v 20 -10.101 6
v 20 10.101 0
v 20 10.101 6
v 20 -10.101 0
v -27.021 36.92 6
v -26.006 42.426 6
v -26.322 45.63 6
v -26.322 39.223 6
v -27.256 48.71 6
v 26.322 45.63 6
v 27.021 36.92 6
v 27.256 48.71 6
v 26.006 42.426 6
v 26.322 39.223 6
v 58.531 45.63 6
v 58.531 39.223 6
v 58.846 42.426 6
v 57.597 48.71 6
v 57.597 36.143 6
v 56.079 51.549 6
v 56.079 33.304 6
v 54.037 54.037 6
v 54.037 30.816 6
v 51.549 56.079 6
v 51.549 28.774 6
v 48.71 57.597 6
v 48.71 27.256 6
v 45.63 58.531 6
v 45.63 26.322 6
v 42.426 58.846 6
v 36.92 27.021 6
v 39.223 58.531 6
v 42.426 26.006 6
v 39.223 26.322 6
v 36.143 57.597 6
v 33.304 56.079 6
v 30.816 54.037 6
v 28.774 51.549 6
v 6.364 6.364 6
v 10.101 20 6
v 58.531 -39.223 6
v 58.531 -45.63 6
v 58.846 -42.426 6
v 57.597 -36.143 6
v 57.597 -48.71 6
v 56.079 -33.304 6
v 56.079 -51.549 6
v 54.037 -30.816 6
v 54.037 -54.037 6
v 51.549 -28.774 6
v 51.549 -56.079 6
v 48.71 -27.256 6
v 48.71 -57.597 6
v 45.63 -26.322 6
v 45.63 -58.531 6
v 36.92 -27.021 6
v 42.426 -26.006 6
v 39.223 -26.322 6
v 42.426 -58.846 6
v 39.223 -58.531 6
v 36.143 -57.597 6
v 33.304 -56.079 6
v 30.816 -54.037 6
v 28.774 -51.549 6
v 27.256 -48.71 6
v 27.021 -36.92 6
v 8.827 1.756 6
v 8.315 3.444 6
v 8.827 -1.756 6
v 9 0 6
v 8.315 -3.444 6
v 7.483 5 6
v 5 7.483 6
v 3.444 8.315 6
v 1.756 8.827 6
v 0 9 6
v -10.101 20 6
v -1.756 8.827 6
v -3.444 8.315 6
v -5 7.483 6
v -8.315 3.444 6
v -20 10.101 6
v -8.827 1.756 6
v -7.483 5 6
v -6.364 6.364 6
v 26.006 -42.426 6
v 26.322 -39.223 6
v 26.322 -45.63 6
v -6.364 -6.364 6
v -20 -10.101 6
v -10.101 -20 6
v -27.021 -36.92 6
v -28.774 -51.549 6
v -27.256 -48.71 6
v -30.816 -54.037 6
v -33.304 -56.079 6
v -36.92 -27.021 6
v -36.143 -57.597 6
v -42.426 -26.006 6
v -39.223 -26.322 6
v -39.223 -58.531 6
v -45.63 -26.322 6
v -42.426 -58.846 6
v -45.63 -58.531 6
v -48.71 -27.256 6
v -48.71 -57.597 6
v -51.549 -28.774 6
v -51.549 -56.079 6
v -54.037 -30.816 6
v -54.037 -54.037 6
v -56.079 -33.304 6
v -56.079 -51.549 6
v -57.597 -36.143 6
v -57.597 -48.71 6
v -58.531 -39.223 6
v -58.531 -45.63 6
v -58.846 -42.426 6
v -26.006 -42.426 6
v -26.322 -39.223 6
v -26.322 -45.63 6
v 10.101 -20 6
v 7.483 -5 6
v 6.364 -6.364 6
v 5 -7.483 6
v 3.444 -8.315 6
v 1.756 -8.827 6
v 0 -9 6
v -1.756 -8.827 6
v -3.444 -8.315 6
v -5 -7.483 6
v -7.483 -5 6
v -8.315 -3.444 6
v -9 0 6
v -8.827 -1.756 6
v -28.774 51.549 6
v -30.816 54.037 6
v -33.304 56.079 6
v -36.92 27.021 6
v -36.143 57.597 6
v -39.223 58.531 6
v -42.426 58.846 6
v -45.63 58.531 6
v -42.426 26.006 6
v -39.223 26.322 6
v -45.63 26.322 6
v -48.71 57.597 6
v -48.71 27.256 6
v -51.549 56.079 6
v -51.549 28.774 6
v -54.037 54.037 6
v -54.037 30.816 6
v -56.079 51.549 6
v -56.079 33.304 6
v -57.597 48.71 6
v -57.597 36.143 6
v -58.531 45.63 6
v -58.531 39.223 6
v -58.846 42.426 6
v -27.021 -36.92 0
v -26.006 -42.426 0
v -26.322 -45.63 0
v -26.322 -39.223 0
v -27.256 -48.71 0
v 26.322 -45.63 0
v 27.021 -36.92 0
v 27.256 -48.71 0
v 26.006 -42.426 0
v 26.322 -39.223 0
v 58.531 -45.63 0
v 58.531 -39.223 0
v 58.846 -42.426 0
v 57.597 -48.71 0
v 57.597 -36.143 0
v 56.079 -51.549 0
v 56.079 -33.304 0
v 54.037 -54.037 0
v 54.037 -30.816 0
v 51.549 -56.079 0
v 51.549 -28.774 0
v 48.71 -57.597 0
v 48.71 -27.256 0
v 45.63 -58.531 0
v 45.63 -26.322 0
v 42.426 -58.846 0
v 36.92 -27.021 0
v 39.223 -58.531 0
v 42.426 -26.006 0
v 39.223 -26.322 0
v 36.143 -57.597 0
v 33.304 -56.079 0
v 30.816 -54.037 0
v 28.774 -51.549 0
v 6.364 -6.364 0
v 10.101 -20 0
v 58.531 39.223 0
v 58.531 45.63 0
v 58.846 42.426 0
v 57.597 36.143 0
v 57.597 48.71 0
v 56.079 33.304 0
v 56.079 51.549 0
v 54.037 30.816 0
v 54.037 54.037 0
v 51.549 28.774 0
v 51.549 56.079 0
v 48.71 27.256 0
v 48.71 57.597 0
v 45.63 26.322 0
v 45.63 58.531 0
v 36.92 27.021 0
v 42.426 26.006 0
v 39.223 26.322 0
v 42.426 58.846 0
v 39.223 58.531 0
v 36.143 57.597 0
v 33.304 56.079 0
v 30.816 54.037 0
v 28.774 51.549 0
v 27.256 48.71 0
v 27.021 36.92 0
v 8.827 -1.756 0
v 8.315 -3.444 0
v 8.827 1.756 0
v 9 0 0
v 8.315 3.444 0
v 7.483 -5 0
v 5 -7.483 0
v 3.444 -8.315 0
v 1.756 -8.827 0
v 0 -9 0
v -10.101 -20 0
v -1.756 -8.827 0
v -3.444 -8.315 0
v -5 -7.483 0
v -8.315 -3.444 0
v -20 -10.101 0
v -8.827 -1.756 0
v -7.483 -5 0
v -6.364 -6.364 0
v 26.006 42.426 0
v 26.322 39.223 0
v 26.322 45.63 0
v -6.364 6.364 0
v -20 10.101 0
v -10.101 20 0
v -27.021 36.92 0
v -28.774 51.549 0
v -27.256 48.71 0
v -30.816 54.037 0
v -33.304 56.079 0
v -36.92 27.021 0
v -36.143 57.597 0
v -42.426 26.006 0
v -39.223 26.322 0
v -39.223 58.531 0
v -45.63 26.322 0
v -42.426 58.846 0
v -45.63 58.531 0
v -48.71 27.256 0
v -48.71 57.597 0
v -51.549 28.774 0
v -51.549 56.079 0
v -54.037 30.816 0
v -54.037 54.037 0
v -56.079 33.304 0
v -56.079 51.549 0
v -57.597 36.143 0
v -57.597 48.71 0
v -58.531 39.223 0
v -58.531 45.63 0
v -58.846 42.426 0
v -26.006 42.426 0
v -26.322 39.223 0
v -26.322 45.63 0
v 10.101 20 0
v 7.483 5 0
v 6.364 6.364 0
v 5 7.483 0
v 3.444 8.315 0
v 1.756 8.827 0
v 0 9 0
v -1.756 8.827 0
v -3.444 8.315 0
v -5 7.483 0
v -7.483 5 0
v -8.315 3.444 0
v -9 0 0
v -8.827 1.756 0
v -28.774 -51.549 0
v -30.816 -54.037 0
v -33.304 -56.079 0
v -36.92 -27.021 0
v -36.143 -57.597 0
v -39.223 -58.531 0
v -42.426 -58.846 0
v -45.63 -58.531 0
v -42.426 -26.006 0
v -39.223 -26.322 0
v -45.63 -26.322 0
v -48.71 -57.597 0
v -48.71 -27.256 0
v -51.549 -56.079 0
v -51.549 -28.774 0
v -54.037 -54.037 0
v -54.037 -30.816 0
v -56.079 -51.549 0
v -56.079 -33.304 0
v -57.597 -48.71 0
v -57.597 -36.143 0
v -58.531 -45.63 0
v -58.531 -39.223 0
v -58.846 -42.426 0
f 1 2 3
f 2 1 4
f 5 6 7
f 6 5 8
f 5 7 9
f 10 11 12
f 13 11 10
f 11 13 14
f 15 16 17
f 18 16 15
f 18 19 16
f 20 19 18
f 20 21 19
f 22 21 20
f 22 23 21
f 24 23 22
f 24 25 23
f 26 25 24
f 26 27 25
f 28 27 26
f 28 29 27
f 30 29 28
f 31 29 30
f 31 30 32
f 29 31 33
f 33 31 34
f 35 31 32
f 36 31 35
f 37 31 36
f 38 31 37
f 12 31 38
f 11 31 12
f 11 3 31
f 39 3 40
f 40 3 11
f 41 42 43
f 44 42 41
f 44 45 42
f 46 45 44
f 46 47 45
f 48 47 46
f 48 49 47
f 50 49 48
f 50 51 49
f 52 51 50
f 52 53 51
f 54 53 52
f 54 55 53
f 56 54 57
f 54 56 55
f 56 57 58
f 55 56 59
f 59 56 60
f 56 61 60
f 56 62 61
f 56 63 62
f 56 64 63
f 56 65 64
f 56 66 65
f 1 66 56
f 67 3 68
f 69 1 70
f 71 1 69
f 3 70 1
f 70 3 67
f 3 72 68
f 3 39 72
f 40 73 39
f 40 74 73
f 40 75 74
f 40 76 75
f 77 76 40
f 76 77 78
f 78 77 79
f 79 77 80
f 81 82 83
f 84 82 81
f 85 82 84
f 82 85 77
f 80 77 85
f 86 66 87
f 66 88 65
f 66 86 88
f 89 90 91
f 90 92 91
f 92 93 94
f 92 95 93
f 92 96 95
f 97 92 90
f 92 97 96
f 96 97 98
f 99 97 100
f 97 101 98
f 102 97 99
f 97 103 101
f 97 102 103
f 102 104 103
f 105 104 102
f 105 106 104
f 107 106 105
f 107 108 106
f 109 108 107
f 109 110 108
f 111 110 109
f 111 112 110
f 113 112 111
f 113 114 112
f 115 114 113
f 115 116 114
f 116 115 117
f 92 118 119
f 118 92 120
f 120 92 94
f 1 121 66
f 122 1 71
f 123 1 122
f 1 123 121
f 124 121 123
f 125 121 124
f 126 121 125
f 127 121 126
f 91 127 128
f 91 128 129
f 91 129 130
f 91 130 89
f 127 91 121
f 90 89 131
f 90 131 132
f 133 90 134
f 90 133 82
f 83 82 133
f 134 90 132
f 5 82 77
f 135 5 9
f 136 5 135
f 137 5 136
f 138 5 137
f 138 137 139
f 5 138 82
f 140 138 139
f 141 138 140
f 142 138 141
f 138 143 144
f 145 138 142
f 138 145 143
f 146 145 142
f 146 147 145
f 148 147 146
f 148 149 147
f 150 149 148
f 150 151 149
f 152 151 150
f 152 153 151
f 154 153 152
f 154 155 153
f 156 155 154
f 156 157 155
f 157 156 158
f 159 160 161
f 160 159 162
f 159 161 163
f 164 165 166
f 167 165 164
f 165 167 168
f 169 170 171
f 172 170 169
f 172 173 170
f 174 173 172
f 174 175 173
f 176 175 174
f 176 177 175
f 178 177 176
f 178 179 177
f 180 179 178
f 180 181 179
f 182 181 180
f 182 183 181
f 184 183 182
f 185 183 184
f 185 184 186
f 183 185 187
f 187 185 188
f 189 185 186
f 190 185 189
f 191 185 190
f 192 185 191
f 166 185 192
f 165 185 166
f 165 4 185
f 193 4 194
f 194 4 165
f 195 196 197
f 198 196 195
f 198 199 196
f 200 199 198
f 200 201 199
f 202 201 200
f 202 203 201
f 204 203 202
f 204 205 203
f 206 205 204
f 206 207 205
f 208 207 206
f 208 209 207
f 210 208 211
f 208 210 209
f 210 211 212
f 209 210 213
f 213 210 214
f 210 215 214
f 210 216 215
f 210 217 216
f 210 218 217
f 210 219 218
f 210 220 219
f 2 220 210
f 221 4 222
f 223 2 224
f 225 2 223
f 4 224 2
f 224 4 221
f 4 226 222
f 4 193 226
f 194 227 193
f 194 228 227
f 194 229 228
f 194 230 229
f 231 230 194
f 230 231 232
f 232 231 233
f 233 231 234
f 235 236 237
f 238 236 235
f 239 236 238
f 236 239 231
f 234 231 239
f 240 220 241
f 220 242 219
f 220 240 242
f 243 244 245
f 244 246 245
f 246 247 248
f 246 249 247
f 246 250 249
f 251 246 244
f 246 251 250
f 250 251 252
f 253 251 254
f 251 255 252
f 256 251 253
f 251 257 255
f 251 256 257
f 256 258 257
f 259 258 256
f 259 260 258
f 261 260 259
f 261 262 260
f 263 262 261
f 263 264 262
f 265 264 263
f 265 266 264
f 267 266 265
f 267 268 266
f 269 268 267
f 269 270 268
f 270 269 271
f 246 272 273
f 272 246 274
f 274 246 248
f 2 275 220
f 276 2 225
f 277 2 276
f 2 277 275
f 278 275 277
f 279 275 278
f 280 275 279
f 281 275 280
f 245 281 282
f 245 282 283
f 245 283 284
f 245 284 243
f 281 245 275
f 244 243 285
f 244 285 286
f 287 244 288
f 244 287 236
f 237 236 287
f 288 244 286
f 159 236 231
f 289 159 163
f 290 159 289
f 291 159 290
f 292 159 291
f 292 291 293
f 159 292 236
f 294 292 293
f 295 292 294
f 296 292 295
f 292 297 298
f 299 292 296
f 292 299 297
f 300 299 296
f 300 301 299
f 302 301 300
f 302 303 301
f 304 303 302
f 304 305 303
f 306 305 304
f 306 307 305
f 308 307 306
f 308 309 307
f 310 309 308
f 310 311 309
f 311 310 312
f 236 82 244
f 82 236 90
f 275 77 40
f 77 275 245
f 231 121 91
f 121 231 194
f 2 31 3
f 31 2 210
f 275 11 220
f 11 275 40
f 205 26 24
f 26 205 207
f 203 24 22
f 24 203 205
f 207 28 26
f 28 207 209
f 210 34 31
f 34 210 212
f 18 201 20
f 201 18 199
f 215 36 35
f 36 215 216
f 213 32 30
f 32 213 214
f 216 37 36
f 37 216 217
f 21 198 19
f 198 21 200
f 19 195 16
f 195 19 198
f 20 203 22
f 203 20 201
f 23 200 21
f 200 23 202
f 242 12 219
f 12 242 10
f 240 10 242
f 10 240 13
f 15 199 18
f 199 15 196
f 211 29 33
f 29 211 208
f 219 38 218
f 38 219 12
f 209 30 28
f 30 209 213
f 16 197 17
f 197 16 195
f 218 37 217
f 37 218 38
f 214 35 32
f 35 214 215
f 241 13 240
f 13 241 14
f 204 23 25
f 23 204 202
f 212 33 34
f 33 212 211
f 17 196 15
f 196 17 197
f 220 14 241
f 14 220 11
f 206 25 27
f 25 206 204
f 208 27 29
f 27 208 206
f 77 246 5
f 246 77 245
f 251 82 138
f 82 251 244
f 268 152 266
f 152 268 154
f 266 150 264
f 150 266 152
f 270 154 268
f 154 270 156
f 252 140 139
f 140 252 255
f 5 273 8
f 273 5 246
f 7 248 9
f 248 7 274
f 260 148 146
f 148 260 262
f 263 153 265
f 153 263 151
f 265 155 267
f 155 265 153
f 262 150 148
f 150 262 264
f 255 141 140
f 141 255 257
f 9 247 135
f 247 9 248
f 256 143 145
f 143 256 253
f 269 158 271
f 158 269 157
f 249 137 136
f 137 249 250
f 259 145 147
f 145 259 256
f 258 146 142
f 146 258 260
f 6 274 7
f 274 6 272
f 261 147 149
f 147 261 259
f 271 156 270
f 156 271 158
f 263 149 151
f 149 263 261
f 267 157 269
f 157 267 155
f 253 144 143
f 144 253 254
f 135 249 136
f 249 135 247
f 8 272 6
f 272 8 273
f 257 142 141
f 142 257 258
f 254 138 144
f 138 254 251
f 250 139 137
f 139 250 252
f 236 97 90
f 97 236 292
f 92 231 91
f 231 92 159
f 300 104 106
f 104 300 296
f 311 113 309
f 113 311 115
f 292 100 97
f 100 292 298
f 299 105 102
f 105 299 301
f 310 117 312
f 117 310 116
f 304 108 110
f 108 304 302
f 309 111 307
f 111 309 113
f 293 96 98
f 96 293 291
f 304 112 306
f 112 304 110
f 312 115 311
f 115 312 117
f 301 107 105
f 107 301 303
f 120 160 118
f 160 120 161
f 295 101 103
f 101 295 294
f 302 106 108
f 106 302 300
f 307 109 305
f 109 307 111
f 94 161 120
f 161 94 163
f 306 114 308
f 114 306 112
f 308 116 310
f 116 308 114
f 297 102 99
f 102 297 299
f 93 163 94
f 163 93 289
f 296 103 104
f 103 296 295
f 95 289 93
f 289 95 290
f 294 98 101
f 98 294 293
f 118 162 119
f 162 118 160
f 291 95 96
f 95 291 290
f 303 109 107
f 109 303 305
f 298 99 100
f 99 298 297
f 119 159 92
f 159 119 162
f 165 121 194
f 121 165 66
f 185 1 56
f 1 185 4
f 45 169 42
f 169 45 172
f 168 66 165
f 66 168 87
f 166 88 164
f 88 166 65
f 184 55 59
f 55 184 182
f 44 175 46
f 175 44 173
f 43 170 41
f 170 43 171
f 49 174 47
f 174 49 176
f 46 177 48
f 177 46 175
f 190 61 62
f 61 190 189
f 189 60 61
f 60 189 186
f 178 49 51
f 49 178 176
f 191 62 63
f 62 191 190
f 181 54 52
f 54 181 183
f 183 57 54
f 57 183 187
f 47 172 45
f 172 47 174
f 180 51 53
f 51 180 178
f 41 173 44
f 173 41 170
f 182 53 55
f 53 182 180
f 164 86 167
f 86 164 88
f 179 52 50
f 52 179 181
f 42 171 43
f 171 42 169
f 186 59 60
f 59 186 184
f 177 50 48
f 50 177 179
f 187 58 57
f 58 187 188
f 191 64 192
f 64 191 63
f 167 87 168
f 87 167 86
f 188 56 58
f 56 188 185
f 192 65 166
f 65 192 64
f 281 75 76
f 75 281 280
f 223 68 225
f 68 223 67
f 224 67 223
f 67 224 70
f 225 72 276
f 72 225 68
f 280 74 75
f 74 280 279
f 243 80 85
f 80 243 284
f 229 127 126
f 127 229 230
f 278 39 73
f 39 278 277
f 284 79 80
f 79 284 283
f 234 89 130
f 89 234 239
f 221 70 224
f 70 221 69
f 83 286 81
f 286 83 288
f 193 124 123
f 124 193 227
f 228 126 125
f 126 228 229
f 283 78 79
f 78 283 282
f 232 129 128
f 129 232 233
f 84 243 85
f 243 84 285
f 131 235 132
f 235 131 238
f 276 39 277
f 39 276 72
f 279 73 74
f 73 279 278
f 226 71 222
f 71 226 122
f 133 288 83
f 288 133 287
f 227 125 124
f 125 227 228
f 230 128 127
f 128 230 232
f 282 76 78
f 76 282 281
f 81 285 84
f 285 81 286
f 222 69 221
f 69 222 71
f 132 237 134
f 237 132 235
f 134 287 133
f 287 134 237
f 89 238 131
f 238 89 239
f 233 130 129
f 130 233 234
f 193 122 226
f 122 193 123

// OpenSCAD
$fn = 32;

// ----------------------------------------------------------------------
// Quadcopter frame: 152.84 mm across the motor pads, arms 60 mm
// ----------------------------------------------------------------------

// --- parameters (mm) ---
hub = 40;                 // central plate size
plate_t = 6;              // plate thickness
arm_len = 60;             // hub centre to motor pad centre
bar_w = 14;               // arm width
pad_d = 32.84;            // motor pad diameter
centre_d = 18;            // central cut-out for the stack

module arm_bar() {
  /* flat bar: hull of a stub inside the hub and a box at the pad */
  hull() {
    translate([hub / 4, 0, plate_t / 2]) cube([bar_w, bar_w, plate_t], center = true);
    translate([arm_len, 0, plate_t / 2]) cube([bar_w, bar_w, plate_t], center = true);
  }
}

module pad() {
  translate([arm_len, 0, 0]) cylinder(h = plate_t, d = pad_d);
}

module frame() {
  translate([-hub / 2, -hub / 2, 0]) cube([hub, hub, plate_t]);
  rotate([0, 0, 45]) arm_bar();
  rotate([0, 0, 45]) pad();
  rotate([0, 0, 135]) arm_bar();
  rotate([0, 0, 135]) pad();
  rotate([0, 0, 225]) arm_bar();
  rotate([0, 0, 225]) pad();
  rotate([0, 0, 315]) arm_bar();
  rotate([0, 0, 315]) pad();
}

difference() {
  frame();
  translate([0, 0, -1]) cylinder(h = plate_t + 2, d = centre_d);
}
